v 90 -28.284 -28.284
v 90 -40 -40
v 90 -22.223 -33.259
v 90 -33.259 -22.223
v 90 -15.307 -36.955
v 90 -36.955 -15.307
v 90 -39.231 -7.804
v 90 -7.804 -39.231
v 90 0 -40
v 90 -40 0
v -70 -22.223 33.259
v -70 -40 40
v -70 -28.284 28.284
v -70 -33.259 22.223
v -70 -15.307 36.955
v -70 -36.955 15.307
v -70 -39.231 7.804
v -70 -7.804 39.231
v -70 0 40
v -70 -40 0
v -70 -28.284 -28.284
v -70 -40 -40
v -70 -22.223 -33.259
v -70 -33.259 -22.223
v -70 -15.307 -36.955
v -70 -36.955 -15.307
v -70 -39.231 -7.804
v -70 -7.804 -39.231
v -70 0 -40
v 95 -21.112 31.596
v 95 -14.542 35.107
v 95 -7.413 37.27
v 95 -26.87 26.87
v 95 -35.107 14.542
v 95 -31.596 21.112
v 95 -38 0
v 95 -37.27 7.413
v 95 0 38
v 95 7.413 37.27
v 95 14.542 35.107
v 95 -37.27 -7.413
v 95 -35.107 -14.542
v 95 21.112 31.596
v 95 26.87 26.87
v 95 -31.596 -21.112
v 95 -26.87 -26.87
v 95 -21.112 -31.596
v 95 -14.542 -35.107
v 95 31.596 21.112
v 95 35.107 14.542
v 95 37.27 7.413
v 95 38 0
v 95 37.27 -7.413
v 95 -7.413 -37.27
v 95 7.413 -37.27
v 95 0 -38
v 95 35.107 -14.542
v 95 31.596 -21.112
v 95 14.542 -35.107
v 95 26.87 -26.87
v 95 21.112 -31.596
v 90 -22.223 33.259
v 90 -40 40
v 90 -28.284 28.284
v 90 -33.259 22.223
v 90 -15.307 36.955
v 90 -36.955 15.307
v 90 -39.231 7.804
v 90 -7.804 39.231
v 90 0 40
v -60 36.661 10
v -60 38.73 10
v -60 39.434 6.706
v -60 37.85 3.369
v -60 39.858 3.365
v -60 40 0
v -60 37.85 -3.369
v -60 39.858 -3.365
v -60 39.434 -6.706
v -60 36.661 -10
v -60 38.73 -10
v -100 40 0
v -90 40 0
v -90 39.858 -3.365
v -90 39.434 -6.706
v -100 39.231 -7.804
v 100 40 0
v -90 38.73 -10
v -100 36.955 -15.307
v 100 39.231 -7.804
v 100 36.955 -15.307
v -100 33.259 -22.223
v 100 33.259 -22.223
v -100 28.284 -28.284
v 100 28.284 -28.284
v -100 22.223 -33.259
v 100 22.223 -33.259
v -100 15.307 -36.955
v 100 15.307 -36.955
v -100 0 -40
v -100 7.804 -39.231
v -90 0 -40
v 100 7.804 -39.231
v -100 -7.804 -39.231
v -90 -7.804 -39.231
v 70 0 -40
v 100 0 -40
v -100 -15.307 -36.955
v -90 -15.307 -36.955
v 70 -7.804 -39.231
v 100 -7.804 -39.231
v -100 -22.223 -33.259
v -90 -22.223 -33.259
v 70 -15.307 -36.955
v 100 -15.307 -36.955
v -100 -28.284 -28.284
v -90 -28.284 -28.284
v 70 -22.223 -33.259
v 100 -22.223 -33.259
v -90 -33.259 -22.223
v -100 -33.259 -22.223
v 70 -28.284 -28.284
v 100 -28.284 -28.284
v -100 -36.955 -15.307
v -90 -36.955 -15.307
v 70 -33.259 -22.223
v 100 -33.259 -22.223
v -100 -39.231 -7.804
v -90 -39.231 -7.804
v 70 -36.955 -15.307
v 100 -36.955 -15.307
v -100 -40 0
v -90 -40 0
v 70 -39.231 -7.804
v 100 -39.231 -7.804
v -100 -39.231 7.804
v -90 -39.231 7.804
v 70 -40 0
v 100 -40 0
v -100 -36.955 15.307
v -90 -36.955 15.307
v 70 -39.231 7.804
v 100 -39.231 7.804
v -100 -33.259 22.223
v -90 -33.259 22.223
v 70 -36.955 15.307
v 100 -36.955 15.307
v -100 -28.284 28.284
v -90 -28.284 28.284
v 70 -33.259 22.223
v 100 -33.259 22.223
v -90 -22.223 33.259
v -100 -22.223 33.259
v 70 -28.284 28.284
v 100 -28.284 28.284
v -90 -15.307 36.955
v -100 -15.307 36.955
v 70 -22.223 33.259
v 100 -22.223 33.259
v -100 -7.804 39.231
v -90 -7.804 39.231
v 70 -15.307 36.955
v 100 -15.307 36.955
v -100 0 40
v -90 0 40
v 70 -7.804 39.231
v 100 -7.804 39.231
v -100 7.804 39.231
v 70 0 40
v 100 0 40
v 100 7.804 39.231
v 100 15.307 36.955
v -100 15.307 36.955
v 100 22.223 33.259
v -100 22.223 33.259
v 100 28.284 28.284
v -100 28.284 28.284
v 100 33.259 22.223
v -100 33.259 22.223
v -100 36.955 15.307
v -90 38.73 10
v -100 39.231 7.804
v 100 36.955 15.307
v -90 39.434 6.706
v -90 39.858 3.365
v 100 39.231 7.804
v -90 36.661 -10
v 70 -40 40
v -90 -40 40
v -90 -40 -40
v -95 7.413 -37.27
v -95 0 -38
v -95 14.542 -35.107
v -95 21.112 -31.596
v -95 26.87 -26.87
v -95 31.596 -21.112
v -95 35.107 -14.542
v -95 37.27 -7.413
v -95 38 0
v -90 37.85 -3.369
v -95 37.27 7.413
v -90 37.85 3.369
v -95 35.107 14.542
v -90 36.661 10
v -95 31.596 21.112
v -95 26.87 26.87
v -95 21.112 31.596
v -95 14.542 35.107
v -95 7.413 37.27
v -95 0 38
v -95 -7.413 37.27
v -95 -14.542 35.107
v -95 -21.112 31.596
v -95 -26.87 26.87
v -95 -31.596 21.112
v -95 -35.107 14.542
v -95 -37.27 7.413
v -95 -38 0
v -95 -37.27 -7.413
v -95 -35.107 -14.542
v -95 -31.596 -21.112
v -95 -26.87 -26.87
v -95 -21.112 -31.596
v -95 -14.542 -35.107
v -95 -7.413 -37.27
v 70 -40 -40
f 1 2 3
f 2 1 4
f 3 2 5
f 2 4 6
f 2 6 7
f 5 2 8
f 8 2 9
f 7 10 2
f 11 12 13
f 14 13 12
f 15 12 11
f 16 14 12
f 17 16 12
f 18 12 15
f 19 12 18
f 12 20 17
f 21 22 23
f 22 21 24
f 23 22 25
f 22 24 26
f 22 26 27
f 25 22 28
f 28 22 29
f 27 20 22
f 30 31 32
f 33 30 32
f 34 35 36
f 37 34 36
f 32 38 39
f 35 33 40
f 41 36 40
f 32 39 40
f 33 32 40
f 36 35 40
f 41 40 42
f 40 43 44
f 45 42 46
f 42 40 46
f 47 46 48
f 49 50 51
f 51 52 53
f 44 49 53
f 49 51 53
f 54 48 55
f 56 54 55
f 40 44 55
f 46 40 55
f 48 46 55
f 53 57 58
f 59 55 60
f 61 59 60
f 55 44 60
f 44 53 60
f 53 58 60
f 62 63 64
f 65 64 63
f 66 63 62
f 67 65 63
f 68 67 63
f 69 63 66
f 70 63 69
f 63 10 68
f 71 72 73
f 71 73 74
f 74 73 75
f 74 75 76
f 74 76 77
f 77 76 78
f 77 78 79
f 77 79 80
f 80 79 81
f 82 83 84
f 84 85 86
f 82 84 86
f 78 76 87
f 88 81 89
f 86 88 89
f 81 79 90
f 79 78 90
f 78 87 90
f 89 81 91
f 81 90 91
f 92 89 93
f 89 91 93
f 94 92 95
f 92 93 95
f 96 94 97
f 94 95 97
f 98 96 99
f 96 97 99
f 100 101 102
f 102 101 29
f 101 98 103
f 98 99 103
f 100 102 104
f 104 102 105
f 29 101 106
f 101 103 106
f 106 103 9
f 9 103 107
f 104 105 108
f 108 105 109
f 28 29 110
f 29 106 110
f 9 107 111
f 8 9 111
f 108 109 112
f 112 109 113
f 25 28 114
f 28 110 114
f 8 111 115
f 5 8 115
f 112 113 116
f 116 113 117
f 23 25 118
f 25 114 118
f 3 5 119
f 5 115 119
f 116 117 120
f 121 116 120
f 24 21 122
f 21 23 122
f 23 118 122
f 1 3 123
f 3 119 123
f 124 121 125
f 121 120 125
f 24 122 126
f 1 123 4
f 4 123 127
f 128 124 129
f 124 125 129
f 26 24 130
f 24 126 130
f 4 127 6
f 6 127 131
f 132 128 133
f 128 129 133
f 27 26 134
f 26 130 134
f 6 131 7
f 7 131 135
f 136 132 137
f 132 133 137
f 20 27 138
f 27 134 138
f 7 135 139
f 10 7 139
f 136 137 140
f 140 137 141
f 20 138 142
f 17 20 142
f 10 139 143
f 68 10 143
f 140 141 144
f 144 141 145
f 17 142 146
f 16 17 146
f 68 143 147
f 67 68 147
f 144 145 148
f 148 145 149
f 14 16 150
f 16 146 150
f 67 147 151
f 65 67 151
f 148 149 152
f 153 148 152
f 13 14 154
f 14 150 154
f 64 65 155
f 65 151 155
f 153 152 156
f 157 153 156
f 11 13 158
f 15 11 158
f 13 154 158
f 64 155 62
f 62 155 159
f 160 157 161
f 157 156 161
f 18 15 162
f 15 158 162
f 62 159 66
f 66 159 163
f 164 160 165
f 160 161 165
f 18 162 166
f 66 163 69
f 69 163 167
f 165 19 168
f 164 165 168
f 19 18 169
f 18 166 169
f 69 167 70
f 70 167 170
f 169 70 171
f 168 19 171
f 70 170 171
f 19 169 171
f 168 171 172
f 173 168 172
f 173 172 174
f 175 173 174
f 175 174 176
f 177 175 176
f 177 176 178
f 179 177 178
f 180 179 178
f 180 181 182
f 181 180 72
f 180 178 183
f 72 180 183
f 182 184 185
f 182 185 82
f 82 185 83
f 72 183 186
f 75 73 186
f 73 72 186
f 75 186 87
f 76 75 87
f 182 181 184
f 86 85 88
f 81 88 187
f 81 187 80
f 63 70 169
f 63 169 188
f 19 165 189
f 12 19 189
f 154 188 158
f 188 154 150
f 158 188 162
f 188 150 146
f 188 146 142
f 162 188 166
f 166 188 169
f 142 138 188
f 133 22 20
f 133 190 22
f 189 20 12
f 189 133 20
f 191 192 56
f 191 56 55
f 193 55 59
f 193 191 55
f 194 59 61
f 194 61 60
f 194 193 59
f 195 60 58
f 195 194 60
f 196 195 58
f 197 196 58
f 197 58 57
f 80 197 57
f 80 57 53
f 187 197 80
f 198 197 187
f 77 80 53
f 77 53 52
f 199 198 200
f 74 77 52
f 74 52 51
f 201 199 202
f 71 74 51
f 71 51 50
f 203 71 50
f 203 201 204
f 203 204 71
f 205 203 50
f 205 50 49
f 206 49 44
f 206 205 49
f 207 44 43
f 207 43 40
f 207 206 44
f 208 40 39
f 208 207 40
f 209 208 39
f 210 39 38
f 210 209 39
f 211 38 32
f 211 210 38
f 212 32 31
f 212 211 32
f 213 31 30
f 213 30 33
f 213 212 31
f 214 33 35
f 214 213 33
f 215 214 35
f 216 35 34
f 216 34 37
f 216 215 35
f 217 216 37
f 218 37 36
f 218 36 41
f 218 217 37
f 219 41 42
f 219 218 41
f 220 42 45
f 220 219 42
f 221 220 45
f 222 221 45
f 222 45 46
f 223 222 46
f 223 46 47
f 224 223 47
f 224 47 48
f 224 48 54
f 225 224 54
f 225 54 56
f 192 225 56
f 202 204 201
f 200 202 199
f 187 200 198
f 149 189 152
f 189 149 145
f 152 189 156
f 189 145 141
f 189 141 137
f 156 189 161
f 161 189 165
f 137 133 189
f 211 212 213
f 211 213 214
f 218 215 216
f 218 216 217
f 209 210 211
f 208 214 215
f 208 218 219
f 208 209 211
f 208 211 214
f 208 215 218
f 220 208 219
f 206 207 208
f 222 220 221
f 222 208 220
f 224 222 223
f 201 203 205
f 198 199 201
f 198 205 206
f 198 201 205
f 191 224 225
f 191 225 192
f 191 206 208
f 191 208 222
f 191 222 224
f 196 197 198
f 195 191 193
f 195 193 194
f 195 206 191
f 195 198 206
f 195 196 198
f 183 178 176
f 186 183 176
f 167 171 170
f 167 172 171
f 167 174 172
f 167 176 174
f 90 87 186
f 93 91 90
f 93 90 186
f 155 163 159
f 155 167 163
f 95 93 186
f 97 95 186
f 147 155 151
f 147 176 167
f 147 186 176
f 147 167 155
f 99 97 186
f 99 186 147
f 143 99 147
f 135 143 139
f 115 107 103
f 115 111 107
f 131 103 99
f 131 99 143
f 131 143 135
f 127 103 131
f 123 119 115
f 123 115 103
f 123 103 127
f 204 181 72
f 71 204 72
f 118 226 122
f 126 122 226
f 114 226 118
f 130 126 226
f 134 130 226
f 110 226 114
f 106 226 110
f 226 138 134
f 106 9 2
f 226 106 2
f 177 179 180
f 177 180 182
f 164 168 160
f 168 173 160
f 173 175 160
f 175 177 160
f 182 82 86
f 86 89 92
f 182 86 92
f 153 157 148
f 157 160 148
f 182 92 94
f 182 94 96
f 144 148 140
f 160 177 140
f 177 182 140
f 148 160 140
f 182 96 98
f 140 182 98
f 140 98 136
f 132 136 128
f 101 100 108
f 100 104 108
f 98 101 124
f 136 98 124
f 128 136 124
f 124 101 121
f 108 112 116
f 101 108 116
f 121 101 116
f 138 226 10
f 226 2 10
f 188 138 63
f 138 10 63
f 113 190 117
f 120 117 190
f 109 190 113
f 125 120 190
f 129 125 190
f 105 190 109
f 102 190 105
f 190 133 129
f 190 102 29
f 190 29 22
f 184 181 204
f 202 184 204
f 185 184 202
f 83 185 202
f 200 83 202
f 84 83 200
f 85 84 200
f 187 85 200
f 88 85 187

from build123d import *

# Parameters (mm, degrees)
IZIM1_W                     = 200
IZIM1_H                     = 40
IZIM2_R                     = 38
KES_EKSTR_ZYON2_DEPTH       = 190
IZIM3_W                     = 30
IZIM3_H                     = 20
KES_EKSTR_ZYON3_DEPTH       = 10
Y_KSEKLIK_EKSTR_ZYON1_DEPTH = 10
AYNALAMA2_COPY_1_DEPTH      = 10


with BuildPart() as part:
    # Çizim1 → Döndür1 (revolve)
    with BuildSketch(Plane.XY):
        with Locations((0, 20)):
            Rectangle(IZIM1_W, IZIM1_H)
    revolve(axis=Axis((100, 0, 0), (-1, 0, 0)))

    # Çizim2 → Kes-Ekstrüzyon2 (cut)
    with BuildSketch(Plane(origin=(-95, 0, 0), x_dir=(0, 0, -1), z_dir=(1, 0, 0))):
        Circle(IZIM2_R)
    extrude(amount=KES_EKSTR_ZYON2_DEPTH, mode=Mode.SUBTRACT)

    # Çizim3 → Kes-Ekstrüzyon3 (cut)
    with BuildSketch(Plane(origin=(0, 40, 0), x_dir=(1, 0, 0), z_dir=(0, 1, 0))):
        with Locations((-75, 0)):
            Rectangle(IZIM3_W, IZIM3_H)
    extrude(amount=-KES_EKSTR_ZYON3_DEPTH, mode=Mode.SUBTRACT)

    # Çizim5 → Yükseklik-Ekstrüzyon1 (add, symmetric)
    with BuildSketch(Plane(origin=(80, 0, 0), x_dir=(0, 0, -1), z_dir=(1, 0, 0))):
        with BuildLine():
            ThreePointArc((0, -40), (-28.284271247, -28.284271247), (-40, 0))
            Line((-40, 0), (-40, -40))
            Line((-40, -40), (0, -40))
        make_face()
    y_kseklik_ekstr_zyon1 = extrude(amount=Y_KSEKLIK_EKSTR_ZYON1_DEPTH, both=True)

    # Aynalama1: Yükseklik-Ekstrüzyon1 across plane
    add(y_kseklik_ekstr_zyon1.mirror(Plane.XY))

    # Aynalama2: Yükseklik-Ekstrüzyon1 across plane
    add(y_kseklik_ekstr_zyon1.mirror(Plane(origin=(0, 0, 0), x_dir=(0, 0, 1), z_dir=(1, 0, 0))))

    # Aynalama2 copy 1 sketch → Aynalama2 copy 1 (add, symmetric)
    with BuildSketch(Plane.ZY.offset(80)):
        with BuildLine():
            ThreePointArc((0, -40), (-28.284271247, -28.284271247), (-40, 0))
            Line((-40, 0), (-40, -40))
            Line((-40, -40), (0, -40))
        make_face()
    extrude(amount=AYNALAMA2_COPY_1_DEPTH, both=True)


solid = part.part
